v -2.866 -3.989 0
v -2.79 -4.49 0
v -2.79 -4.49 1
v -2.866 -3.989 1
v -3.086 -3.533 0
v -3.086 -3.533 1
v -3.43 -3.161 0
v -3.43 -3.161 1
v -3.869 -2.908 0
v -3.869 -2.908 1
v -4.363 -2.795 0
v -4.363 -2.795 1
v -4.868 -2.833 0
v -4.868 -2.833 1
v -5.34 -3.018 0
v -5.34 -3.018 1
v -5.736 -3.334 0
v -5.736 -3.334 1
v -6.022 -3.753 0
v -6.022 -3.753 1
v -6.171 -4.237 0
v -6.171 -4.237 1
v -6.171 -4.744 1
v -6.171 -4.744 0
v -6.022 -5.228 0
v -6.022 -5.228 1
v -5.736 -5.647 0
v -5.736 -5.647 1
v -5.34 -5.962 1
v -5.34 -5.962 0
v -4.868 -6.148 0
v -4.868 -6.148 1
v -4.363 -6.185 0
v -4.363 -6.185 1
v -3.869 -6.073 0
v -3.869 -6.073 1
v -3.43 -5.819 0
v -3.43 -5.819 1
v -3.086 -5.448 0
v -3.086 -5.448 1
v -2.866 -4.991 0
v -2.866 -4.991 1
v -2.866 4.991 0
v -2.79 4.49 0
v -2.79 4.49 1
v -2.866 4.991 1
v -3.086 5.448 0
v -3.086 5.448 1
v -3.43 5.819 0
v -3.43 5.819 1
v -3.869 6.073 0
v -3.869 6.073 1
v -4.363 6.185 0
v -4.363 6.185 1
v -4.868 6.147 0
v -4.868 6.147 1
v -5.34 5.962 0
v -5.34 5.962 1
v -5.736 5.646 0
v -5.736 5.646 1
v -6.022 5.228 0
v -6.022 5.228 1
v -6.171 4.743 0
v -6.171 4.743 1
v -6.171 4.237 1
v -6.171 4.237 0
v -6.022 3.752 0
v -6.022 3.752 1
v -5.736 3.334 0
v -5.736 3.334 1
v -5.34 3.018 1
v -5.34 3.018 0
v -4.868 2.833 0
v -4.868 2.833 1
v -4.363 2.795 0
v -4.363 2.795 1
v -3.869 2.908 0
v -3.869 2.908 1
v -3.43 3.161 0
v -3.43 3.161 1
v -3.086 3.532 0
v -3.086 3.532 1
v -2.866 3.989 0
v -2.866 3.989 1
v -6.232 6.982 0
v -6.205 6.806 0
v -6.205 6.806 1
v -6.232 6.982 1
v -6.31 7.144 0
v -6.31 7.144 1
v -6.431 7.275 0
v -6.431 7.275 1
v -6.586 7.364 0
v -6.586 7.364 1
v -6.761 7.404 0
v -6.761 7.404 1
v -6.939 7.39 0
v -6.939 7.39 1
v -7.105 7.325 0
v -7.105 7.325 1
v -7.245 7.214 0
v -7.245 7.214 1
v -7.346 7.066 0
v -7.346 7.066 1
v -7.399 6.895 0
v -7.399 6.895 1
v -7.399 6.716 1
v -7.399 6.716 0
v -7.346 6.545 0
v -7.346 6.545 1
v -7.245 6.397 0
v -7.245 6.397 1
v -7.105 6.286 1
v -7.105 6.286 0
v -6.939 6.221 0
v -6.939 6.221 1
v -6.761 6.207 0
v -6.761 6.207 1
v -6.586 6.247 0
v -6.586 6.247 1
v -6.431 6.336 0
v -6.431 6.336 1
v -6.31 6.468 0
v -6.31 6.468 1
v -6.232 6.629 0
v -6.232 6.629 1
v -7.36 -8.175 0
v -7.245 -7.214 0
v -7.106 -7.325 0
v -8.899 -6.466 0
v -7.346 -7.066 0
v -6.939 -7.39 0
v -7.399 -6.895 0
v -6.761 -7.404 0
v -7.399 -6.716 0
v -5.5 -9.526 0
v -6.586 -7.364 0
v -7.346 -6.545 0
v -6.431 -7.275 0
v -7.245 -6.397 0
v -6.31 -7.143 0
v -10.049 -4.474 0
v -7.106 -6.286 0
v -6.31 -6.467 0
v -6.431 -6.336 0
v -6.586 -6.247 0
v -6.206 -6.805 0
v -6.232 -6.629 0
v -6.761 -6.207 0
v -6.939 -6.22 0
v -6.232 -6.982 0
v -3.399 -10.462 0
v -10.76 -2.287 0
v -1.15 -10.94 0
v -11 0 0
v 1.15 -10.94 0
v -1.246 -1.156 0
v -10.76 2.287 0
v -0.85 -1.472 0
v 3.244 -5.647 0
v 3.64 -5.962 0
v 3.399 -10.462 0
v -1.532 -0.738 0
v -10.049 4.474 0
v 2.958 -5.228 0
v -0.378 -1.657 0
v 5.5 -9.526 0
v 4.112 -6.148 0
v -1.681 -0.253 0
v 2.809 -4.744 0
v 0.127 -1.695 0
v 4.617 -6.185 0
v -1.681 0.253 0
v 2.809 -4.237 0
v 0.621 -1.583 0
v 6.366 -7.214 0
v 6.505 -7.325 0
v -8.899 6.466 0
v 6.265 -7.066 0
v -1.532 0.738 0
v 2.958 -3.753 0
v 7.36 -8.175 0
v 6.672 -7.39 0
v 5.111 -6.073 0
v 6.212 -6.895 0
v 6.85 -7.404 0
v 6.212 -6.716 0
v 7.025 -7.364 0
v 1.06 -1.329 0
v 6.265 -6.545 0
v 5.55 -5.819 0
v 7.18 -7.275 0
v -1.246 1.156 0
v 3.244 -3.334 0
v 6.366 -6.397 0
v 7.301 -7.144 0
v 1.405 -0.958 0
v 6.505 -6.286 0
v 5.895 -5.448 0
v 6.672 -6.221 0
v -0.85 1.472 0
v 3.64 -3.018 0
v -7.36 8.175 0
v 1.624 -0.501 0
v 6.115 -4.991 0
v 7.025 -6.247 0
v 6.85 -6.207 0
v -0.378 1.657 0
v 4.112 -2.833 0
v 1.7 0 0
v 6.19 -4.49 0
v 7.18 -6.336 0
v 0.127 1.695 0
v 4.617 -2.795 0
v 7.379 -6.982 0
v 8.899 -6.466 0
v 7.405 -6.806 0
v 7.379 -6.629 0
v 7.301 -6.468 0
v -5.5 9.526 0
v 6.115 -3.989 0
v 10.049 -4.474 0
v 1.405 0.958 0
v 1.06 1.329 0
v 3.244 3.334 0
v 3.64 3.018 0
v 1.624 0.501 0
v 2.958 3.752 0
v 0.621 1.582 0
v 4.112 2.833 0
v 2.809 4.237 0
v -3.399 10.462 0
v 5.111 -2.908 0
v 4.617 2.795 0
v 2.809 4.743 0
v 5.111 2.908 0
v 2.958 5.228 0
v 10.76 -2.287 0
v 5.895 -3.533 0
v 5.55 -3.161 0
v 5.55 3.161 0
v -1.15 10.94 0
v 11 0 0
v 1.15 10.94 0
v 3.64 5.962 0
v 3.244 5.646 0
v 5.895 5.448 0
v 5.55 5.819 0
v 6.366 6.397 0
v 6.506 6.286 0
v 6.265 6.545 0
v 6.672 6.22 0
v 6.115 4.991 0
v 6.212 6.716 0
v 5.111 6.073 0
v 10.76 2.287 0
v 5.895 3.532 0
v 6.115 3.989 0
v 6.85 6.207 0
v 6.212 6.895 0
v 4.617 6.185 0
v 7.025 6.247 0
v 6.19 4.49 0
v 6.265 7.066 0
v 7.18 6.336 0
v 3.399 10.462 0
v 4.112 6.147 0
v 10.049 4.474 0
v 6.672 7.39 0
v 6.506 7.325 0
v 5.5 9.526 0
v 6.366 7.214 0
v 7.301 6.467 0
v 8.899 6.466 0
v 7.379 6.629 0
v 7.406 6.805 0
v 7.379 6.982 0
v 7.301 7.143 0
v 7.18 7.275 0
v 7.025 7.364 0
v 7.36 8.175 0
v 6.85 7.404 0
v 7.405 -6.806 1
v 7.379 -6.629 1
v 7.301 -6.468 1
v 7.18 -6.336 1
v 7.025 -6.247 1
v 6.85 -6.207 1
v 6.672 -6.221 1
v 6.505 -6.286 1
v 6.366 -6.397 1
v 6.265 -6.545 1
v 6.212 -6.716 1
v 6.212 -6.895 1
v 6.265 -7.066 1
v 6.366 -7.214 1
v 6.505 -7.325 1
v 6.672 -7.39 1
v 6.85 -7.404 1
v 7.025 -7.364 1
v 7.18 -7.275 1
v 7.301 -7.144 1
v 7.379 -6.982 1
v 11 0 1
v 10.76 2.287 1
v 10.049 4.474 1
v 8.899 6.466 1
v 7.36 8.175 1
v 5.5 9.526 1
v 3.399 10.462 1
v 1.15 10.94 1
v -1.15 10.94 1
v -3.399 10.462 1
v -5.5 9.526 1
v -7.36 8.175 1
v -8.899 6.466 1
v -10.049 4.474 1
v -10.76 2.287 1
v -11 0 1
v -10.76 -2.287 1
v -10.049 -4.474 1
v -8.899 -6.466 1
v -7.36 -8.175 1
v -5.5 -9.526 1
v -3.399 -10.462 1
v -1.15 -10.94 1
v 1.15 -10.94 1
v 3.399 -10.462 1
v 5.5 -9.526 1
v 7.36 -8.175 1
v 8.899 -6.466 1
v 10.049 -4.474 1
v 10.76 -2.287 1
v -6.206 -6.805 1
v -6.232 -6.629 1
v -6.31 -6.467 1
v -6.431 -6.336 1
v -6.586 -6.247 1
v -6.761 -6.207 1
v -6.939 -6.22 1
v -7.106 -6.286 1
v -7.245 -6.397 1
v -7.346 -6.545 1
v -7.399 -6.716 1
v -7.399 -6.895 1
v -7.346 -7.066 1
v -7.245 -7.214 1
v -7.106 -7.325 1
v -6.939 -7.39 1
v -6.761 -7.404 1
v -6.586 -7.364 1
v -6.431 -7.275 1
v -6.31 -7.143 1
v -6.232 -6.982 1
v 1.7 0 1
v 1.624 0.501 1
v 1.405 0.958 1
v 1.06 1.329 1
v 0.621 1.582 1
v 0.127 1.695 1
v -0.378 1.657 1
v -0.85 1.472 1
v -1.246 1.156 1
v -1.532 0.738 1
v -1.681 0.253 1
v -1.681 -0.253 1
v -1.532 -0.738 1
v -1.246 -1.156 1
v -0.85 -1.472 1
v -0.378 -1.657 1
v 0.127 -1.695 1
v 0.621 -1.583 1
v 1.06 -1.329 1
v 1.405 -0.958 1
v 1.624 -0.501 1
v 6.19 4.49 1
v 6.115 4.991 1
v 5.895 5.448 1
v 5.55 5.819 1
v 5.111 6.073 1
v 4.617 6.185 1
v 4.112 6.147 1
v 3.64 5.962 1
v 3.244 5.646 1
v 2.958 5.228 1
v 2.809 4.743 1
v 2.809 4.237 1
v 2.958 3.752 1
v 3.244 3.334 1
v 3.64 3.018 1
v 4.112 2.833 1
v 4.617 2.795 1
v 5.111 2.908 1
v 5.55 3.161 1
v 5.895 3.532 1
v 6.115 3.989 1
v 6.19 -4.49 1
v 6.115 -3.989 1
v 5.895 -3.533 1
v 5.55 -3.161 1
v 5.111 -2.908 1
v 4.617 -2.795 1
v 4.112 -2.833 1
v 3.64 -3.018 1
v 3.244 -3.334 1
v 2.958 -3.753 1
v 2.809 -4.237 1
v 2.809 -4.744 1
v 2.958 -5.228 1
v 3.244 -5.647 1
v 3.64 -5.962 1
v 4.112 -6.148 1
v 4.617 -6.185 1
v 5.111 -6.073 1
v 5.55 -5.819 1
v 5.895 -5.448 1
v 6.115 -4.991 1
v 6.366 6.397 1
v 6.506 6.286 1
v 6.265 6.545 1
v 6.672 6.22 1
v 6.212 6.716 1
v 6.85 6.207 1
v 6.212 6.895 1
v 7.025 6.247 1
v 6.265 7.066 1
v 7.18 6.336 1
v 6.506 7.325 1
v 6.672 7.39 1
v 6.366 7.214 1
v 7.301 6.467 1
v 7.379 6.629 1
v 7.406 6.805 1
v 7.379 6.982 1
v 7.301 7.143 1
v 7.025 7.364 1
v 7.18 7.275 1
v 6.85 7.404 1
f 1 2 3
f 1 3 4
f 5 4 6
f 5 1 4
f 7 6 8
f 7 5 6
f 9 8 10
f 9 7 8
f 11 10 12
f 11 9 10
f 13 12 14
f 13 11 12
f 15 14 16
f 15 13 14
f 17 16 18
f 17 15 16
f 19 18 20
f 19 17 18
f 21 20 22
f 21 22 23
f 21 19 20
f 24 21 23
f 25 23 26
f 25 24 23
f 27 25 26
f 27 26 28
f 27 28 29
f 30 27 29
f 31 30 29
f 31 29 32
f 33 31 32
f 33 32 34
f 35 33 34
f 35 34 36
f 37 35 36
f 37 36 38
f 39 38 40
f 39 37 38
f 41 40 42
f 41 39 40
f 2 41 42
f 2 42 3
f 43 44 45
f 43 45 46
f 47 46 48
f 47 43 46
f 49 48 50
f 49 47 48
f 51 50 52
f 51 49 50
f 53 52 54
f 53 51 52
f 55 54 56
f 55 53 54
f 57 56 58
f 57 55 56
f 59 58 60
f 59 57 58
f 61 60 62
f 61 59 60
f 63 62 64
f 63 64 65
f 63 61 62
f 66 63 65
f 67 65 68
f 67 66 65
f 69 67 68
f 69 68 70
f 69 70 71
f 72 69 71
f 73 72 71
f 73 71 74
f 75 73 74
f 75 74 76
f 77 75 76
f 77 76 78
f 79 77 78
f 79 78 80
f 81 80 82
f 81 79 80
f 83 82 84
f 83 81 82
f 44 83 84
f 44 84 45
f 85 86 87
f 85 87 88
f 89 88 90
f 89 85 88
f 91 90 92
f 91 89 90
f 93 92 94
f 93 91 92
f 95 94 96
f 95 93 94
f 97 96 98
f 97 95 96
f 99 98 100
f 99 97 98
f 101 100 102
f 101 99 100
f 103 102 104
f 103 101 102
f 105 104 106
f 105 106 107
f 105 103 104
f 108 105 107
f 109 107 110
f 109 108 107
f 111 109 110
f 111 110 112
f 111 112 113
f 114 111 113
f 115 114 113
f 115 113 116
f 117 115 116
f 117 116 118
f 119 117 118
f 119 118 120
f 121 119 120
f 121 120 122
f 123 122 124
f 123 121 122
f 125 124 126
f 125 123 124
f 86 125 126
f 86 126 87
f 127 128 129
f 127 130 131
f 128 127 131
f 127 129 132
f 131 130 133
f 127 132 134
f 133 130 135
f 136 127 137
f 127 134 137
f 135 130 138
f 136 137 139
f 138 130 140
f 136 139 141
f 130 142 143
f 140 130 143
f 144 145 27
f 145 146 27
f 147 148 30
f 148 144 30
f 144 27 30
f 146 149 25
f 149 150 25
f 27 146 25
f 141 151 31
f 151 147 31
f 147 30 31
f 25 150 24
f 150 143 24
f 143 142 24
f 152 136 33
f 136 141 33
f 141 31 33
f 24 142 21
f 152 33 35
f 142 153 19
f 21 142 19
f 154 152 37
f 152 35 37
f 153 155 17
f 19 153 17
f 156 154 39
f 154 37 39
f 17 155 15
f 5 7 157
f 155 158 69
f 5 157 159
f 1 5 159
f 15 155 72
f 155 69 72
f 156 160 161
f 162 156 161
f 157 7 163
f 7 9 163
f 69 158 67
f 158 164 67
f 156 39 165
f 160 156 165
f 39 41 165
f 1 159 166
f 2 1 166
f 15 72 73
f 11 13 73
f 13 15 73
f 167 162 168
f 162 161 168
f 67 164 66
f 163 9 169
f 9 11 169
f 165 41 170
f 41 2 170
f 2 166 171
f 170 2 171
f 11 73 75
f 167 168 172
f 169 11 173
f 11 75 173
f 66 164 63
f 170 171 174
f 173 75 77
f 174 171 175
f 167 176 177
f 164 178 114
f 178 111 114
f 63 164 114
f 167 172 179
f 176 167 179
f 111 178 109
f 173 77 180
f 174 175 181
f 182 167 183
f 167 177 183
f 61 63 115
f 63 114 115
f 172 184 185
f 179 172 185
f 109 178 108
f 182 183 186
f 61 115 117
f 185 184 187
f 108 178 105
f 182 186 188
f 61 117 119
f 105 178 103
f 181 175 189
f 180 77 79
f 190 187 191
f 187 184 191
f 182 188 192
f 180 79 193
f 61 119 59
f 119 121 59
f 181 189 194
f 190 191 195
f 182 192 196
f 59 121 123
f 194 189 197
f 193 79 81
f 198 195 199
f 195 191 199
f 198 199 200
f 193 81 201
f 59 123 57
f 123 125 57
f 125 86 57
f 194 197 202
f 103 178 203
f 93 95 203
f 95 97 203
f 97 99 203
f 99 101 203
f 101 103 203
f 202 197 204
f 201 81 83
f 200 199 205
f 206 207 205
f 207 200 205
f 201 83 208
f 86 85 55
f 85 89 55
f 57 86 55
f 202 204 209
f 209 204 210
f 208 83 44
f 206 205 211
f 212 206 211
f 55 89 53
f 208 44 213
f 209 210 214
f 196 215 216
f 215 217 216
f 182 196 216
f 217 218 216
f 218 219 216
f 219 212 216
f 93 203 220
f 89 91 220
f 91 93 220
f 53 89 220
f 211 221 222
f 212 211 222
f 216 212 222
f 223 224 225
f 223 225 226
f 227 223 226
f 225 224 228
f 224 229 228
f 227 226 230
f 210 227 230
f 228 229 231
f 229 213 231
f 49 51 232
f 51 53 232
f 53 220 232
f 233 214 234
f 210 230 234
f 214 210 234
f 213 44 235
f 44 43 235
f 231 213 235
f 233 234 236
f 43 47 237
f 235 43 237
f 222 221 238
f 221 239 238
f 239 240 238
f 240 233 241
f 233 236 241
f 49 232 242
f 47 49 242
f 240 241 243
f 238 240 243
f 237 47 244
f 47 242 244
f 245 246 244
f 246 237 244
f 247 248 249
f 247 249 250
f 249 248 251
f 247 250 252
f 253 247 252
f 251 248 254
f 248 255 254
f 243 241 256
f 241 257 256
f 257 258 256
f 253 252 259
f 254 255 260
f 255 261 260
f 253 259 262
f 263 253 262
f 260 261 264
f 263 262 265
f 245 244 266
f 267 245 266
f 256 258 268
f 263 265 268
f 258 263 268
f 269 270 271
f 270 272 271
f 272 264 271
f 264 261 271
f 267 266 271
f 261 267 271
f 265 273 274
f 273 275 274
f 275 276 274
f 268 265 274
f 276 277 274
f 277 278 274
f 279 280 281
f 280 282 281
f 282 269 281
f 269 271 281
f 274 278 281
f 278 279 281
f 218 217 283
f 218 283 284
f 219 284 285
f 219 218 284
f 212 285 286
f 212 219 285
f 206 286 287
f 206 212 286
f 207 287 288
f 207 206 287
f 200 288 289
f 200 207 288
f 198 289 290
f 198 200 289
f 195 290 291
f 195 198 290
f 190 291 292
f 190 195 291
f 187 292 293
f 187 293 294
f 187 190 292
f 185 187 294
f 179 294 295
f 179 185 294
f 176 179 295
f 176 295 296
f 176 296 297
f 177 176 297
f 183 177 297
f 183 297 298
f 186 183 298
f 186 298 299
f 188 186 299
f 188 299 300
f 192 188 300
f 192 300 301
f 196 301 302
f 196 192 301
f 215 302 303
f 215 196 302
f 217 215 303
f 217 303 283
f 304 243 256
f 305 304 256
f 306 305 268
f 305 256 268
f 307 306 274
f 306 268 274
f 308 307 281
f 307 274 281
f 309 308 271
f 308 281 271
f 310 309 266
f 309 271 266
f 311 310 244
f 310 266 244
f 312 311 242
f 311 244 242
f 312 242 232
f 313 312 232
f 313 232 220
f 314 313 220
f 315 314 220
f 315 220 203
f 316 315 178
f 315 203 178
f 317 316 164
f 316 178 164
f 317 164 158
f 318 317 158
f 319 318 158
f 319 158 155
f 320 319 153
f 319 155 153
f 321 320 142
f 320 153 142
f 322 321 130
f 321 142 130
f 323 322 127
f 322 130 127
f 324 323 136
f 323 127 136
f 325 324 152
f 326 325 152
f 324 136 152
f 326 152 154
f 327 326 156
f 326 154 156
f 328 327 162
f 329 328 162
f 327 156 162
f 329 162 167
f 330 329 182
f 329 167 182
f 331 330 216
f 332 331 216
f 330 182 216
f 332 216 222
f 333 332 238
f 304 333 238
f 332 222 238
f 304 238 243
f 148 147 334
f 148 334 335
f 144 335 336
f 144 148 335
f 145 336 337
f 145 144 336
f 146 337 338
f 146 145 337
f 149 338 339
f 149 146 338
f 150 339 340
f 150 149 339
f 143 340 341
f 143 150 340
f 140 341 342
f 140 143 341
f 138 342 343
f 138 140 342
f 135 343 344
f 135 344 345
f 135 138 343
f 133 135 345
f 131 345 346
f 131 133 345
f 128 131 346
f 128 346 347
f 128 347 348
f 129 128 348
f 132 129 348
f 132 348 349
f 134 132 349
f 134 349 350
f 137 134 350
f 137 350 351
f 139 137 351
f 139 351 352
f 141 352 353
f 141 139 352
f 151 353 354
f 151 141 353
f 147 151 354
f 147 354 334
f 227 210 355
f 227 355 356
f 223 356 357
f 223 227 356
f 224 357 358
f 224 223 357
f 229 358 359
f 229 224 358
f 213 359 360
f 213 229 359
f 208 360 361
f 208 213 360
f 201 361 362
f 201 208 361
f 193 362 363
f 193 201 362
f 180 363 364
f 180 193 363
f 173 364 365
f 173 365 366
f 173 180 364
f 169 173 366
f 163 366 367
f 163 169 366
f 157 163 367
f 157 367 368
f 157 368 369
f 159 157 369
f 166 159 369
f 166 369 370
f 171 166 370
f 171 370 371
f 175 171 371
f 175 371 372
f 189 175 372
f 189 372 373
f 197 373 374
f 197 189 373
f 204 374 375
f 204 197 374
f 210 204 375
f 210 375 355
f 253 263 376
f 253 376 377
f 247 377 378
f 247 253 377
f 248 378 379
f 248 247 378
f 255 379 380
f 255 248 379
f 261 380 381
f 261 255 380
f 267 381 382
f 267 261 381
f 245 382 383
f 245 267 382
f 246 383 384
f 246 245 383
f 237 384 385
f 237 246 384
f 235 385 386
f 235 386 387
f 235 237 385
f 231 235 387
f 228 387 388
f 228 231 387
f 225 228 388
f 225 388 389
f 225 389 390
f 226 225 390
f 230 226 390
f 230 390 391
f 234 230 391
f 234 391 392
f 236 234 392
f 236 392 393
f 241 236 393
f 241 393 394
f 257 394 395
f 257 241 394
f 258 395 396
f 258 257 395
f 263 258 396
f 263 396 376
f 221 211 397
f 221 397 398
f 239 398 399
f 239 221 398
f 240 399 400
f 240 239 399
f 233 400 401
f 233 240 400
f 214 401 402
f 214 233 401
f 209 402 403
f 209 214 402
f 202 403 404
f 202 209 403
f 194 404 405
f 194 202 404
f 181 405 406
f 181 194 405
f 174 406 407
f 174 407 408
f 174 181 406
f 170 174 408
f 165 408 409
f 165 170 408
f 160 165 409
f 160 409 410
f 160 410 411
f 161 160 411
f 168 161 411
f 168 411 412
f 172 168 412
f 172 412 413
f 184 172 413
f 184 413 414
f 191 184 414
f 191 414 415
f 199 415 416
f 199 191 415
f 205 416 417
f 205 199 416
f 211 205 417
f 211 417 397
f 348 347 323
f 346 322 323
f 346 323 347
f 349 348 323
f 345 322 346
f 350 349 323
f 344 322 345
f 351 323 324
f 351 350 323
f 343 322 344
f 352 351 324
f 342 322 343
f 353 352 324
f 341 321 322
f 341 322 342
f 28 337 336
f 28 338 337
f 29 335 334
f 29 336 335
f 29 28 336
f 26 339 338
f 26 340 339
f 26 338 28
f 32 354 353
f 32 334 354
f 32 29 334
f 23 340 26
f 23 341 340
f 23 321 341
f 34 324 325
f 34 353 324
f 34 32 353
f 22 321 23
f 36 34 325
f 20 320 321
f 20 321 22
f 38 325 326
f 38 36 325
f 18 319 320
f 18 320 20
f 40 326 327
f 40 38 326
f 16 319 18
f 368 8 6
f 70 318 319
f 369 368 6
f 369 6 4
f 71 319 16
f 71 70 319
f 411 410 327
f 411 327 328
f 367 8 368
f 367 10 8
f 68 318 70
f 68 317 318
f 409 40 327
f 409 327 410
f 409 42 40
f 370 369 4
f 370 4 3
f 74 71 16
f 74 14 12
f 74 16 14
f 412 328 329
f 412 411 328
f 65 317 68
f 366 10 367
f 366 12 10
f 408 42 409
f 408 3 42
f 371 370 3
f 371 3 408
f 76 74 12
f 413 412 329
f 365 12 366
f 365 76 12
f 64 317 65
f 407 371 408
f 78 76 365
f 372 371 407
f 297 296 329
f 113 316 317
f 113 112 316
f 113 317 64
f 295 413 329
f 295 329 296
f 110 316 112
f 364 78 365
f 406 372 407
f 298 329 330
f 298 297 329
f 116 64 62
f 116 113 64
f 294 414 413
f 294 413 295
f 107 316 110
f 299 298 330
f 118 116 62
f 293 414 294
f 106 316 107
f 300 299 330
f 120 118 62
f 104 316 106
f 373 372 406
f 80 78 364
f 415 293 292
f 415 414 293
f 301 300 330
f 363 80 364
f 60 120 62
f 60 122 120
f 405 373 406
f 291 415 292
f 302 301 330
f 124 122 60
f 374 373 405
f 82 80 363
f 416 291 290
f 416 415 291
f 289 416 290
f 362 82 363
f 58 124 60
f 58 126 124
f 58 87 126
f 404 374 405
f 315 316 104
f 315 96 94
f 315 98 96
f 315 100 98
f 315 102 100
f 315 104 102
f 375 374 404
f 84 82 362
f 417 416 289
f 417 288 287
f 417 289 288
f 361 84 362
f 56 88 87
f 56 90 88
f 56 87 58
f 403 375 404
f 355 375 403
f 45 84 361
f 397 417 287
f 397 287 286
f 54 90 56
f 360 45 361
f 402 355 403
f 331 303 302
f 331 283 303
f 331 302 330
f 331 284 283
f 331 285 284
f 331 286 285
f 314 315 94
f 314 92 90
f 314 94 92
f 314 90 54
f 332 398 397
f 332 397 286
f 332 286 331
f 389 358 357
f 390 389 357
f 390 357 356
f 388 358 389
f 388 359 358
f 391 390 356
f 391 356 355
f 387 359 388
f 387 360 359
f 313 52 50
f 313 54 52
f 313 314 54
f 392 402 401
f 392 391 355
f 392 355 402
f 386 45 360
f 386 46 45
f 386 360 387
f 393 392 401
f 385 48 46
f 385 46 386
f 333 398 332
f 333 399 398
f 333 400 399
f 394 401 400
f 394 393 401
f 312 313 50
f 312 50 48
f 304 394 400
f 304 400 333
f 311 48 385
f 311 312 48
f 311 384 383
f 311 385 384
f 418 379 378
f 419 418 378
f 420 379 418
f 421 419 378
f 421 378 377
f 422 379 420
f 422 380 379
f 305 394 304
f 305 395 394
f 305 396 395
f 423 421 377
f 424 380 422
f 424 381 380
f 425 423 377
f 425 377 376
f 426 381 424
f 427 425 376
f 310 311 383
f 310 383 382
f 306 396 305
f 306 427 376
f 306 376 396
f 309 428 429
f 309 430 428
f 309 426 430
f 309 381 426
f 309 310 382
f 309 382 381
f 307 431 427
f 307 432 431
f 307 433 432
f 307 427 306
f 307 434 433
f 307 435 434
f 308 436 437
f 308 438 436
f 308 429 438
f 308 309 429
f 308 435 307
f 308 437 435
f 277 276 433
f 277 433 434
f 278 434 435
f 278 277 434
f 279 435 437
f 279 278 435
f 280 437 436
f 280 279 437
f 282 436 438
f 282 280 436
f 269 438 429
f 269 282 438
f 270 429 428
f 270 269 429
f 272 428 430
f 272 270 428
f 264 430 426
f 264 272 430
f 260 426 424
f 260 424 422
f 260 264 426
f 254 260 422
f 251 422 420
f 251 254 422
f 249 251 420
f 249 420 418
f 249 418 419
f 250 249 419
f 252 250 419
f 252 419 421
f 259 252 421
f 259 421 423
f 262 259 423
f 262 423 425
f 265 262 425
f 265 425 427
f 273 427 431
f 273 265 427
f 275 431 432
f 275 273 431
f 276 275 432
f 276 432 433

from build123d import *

# Parameters (mm, degrees)
SKETCH2_R           = 11
SKETCH2_R_2         = 1.7
SKETCH2_R_3         = 0.6
BOSS_EXTRUDE1_DEPTH = 1


with BuildPart() as part:
    # Sketch2 → Boss-Extrude1 (new body)
    with BuildSketch(Plane.XY):
        with Locations((0, -8.8655e-05)):
            Circle(SKETCH2_R)
        with Locations((-4.490128061, 4.490039406)):
            Circle(SKETCH2_R_2, mode=Mode.SUBTRACT)
        with Locations((4.490128061, 4.490039406)):
            Circle(SKETCH2_R_2, mode=Mode.SUBTRACT)
        with Locations((-4.490128061, -4.490216715)):
            Circle(SKETCH2_R_2, mode=Mode.SUBTRACT)
        with Locations((4.490128061, -4.490216715)):
            Circle(SKETCH2_R_2, mode=Mode.SUBTRACT)
        with Locations((0, -8.8655e-05)):
            Circle(SKETCH2_R_2, mode=Mode.SUBTRACT)
        with Locations((6.80553822, 6.805449565)):
            Circle(SKETCH2_R_3, mode=Mode.SUBTRACT)
        with Locations((6.805449565, -6.80553822)):
            Circle(SKETCH2_R_3, mode=Mode.SUBTRACT)
        with Locations((-6.80553822, -6.805449565)):
            Circle(SKETCH2_R_3, mode=Mode.SUBTRACT)
        with Locations((-6.805449565, 6.80553822)):
            Circle(SKETCH2_R_3, mode=Mode.SUBTRACT)
    extrude(amount=BOSS_EXTRUDE1_DEPTH)


solid = part.part
